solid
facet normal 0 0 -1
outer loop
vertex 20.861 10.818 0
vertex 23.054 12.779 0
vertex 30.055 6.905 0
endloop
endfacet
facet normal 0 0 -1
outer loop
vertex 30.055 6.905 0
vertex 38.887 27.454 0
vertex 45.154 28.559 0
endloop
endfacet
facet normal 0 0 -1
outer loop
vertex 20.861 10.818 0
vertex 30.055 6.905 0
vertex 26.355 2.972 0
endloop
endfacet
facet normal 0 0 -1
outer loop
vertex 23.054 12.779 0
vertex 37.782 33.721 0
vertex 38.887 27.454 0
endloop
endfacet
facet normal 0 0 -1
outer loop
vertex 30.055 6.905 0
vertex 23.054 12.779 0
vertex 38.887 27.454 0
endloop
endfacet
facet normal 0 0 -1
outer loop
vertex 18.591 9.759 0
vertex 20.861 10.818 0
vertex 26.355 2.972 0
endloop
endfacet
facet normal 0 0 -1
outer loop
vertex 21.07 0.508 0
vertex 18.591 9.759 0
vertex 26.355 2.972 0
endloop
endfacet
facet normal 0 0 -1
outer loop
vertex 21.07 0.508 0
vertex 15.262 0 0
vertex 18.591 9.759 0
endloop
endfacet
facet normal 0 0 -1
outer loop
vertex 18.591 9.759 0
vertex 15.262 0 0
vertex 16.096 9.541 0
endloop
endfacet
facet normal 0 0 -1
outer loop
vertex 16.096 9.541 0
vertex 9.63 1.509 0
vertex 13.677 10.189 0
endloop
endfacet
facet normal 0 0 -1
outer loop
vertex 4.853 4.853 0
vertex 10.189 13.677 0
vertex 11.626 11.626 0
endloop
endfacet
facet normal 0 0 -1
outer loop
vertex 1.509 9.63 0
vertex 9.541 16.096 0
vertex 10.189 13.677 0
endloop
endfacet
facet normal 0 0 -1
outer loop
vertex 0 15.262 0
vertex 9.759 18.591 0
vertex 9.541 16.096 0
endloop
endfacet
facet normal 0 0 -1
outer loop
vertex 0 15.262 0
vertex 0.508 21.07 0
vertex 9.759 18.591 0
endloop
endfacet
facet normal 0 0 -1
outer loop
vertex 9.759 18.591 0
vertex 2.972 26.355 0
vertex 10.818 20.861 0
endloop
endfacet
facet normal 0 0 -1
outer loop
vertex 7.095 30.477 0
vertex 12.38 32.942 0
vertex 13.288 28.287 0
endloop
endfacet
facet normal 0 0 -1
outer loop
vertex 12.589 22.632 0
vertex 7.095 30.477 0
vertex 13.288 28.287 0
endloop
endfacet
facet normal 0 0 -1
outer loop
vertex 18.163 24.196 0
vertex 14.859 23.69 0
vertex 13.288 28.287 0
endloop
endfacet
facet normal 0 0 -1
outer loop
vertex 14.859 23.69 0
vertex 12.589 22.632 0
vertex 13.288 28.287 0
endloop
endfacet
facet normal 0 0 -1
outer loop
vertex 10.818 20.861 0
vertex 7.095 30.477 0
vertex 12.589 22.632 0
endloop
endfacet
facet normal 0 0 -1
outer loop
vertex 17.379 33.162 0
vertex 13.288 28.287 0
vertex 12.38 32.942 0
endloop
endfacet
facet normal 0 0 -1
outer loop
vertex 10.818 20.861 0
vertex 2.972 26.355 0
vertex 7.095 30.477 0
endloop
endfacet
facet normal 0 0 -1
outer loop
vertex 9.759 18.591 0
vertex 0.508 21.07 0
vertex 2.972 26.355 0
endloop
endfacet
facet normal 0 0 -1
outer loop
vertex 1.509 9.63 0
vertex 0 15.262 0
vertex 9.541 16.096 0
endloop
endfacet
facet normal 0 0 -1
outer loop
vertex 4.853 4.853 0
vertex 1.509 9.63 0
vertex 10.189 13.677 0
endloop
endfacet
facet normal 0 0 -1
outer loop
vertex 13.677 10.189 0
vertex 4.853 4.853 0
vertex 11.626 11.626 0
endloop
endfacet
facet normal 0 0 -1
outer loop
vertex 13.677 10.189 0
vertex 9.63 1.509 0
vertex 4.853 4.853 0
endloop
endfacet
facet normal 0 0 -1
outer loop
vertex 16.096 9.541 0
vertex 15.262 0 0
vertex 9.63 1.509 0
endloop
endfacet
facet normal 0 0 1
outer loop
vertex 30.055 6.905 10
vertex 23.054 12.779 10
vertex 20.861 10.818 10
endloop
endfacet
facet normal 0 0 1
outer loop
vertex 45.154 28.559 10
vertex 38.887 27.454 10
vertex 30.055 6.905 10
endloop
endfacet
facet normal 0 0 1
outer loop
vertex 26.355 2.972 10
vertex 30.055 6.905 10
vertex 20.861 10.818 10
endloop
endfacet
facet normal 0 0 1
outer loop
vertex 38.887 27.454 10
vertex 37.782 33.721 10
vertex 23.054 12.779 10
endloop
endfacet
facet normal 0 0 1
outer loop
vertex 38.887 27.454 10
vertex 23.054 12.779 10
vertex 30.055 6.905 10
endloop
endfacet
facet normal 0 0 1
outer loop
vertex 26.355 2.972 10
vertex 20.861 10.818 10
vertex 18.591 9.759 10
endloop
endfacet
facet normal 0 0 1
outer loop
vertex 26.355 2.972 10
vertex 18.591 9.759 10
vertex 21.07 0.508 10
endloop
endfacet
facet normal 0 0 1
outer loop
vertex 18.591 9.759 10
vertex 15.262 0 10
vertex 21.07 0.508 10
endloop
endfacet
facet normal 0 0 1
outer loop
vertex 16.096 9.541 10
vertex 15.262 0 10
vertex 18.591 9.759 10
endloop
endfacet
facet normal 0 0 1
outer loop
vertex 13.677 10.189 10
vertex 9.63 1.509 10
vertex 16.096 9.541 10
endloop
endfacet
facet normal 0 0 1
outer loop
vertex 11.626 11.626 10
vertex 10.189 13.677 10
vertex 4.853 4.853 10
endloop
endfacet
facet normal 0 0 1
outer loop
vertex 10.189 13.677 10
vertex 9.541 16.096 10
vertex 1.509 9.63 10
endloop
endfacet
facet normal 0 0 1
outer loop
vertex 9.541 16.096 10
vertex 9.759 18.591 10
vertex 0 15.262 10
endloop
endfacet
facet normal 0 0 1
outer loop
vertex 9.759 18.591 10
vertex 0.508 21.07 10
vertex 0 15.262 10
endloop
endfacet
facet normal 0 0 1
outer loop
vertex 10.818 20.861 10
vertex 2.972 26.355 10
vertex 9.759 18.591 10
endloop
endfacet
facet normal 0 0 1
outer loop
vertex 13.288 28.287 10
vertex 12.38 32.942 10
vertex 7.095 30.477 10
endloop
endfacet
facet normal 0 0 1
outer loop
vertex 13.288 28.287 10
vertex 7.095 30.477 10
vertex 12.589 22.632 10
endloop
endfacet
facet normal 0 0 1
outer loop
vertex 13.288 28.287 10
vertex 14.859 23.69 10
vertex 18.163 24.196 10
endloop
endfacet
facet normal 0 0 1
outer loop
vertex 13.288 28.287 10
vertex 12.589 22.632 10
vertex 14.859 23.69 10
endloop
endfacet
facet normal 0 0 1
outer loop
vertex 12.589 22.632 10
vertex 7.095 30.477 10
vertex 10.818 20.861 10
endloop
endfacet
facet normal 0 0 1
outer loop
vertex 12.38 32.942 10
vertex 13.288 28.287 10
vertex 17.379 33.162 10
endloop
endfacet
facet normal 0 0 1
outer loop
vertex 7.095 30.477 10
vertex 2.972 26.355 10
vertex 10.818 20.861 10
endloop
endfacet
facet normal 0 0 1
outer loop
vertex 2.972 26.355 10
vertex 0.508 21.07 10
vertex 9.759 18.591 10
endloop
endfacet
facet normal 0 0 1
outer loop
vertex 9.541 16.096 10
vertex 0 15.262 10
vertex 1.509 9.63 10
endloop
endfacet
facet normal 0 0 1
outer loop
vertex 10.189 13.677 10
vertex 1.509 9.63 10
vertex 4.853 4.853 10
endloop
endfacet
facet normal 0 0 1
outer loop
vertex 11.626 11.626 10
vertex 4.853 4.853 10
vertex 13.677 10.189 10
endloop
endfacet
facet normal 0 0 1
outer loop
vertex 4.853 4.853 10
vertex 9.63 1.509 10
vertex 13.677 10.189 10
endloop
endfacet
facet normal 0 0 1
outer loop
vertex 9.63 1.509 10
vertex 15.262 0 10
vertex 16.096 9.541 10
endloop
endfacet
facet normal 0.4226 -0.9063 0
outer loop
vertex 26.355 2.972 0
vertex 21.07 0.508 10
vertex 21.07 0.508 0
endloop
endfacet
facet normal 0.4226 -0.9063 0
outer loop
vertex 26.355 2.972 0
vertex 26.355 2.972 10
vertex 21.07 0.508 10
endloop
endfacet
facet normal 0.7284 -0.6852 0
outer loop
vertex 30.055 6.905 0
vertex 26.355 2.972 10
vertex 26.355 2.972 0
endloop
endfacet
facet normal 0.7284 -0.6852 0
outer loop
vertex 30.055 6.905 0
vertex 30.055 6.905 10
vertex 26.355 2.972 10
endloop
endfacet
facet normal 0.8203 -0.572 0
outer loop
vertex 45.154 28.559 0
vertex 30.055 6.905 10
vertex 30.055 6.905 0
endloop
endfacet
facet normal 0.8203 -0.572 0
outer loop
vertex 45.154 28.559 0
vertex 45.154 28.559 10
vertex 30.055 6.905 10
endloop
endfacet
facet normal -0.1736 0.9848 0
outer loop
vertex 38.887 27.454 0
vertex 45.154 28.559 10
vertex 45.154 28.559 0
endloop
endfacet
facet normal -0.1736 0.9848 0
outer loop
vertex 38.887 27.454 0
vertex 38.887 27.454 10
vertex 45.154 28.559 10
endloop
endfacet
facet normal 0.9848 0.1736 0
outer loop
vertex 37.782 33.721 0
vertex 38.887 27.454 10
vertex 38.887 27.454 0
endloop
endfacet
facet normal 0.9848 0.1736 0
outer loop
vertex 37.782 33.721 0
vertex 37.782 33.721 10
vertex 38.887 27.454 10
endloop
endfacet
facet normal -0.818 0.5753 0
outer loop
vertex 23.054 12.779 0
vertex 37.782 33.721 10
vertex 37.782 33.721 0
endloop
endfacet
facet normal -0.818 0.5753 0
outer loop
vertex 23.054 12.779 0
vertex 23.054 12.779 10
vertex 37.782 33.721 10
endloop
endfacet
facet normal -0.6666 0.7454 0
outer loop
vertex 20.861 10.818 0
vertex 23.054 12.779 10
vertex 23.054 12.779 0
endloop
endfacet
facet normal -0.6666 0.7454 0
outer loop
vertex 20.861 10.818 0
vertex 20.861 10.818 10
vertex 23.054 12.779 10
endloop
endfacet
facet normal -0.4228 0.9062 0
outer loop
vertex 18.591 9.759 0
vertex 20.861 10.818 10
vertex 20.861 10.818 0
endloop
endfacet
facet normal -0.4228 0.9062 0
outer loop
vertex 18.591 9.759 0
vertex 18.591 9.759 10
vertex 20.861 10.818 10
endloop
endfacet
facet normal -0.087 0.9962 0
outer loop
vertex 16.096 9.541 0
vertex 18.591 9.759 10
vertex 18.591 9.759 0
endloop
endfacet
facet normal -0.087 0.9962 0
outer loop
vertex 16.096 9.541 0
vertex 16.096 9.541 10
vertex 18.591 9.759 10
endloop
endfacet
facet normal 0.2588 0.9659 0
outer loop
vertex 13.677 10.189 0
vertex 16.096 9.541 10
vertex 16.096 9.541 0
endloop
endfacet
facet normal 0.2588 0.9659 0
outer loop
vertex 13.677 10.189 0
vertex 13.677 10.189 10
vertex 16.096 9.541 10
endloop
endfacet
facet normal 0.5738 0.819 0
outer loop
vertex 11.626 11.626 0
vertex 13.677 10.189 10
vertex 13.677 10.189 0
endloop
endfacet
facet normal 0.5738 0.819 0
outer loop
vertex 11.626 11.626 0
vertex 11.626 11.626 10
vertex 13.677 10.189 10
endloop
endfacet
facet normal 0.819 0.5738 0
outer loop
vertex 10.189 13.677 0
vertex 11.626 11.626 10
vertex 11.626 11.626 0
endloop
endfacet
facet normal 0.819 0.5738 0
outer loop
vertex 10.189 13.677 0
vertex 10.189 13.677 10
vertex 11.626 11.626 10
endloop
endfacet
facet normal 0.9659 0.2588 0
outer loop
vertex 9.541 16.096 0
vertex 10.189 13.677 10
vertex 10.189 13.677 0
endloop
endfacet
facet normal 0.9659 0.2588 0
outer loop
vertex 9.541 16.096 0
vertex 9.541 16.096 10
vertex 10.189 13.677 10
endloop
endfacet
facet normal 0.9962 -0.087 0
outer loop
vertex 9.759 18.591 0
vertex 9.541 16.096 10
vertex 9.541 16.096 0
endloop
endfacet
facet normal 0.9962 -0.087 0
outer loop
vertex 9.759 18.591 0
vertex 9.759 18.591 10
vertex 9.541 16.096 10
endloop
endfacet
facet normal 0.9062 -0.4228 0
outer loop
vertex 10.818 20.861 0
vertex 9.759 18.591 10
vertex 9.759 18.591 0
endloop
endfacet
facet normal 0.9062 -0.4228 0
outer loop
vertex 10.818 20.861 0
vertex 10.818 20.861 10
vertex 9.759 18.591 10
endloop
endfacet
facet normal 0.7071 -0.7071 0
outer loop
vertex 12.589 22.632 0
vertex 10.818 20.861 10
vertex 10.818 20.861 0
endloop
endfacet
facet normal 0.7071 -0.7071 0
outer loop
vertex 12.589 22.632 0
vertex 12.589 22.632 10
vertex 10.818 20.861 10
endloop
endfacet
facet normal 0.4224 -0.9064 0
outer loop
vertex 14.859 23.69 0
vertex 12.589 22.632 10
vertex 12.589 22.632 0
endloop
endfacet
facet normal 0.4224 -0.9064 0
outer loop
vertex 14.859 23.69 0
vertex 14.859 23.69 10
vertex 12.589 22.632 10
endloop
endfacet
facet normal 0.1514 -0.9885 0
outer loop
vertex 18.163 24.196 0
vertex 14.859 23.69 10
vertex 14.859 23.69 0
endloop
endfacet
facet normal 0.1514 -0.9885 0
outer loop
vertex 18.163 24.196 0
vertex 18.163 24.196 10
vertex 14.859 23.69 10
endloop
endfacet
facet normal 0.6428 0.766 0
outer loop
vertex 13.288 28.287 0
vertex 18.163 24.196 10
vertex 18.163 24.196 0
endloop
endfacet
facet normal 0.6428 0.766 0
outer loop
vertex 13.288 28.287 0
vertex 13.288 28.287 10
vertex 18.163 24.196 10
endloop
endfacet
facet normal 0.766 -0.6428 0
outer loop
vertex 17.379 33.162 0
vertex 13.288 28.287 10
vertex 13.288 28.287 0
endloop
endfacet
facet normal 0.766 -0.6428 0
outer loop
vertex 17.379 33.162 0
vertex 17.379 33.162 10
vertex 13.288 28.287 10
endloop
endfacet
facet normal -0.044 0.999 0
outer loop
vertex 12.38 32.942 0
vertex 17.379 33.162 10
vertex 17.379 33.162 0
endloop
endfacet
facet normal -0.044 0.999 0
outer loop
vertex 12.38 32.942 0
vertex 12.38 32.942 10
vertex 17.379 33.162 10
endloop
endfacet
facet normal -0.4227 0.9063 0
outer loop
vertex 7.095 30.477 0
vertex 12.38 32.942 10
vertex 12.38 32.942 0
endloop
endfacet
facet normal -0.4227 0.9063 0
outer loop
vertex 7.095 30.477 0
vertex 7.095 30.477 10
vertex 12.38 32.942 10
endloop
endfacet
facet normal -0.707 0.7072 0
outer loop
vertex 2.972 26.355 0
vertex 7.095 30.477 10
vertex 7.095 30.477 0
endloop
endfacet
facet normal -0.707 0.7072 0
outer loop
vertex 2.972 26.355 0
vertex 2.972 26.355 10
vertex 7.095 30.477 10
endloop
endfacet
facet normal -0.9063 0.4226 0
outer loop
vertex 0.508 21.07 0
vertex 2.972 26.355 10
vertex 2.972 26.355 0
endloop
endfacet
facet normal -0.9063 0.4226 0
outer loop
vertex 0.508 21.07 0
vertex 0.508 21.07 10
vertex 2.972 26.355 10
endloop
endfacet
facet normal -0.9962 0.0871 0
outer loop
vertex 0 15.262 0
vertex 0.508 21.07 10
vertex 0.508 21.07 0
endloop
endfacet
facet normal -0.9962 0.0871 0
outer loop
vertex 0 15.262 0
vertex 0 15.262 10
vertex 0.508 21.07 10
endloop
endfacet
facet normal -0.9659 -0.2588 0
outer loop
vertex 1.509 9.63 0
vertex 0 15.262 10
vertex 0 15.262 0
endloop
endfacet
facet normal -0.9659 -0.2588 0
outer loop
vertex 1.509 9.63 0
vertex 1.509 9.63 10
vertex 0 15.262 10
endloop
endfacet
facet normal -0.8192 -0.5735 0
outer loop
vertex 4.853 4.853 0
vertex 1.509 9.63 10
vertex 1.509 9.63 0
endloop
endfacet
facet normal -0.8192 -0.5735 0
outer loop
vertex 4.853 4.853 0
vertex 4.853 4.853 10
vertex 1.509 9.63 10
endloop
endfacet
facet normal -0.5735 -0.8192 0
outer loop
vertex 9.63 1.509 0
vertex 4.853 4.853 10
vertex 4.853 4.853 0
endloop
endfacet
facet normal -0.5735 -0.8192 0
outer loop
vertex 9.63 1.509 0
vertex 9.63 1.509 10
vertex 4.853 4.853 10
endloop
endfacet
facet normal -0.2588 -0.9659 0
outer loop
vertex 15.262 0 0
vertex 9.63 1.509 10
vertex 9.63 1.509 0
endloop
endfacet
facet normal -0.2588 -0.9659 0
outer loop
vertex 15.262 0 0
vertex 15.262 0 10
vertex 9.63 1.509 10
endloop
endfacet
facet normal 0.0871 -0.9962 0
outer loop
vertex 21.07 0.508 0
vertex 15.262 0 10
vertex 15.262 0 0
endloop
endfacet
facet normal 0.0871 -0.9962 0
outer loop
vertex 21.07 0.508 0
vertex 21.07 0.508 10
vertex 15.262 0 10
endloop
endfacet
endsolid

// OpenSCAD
$fn = 32;

// ----------------------------------------------------------------------
// Eye lug: ring_tail, 10 mm thick
// ----------------------------------------------------------------------

// --- parameters (mm) ---
profile_height = 10;      // extrusion height
profile_points = 30;      // points of the closed outline

profile = [[13.288, 28.287], [17.379, 33.162], [12.38, 32.942], [7.095, 30.477], [2.972, 26.355], [0.508, 21.07], [0, 15.262], [1.509, 9.63], [4.853, 4.853], [9.63, 1.509], [15.262, 0], [21.07, 0.508], [26.355, 2.972], [30.055, 6.905], [45.154, 28.559], [38.887, 27.454], [37.782, 33.721], [23.054, 12.779], [20.861, 10.818], [18.591, 9.759], [16.096, 9.541], [13.677, 10.189], [11.626, 11.626], [10.189, 13.677], [9.541, 16.096], [9.759, 18.591], [10.818, 20.861], [12.589, 22.632], [14.859, 23.69], [18.163, 24.196]];  // single closed polygon, 30 points, counter clockwise

// --- the one profile operation ---
linear_extrude(height = profile_height) polygon(points = profile);
